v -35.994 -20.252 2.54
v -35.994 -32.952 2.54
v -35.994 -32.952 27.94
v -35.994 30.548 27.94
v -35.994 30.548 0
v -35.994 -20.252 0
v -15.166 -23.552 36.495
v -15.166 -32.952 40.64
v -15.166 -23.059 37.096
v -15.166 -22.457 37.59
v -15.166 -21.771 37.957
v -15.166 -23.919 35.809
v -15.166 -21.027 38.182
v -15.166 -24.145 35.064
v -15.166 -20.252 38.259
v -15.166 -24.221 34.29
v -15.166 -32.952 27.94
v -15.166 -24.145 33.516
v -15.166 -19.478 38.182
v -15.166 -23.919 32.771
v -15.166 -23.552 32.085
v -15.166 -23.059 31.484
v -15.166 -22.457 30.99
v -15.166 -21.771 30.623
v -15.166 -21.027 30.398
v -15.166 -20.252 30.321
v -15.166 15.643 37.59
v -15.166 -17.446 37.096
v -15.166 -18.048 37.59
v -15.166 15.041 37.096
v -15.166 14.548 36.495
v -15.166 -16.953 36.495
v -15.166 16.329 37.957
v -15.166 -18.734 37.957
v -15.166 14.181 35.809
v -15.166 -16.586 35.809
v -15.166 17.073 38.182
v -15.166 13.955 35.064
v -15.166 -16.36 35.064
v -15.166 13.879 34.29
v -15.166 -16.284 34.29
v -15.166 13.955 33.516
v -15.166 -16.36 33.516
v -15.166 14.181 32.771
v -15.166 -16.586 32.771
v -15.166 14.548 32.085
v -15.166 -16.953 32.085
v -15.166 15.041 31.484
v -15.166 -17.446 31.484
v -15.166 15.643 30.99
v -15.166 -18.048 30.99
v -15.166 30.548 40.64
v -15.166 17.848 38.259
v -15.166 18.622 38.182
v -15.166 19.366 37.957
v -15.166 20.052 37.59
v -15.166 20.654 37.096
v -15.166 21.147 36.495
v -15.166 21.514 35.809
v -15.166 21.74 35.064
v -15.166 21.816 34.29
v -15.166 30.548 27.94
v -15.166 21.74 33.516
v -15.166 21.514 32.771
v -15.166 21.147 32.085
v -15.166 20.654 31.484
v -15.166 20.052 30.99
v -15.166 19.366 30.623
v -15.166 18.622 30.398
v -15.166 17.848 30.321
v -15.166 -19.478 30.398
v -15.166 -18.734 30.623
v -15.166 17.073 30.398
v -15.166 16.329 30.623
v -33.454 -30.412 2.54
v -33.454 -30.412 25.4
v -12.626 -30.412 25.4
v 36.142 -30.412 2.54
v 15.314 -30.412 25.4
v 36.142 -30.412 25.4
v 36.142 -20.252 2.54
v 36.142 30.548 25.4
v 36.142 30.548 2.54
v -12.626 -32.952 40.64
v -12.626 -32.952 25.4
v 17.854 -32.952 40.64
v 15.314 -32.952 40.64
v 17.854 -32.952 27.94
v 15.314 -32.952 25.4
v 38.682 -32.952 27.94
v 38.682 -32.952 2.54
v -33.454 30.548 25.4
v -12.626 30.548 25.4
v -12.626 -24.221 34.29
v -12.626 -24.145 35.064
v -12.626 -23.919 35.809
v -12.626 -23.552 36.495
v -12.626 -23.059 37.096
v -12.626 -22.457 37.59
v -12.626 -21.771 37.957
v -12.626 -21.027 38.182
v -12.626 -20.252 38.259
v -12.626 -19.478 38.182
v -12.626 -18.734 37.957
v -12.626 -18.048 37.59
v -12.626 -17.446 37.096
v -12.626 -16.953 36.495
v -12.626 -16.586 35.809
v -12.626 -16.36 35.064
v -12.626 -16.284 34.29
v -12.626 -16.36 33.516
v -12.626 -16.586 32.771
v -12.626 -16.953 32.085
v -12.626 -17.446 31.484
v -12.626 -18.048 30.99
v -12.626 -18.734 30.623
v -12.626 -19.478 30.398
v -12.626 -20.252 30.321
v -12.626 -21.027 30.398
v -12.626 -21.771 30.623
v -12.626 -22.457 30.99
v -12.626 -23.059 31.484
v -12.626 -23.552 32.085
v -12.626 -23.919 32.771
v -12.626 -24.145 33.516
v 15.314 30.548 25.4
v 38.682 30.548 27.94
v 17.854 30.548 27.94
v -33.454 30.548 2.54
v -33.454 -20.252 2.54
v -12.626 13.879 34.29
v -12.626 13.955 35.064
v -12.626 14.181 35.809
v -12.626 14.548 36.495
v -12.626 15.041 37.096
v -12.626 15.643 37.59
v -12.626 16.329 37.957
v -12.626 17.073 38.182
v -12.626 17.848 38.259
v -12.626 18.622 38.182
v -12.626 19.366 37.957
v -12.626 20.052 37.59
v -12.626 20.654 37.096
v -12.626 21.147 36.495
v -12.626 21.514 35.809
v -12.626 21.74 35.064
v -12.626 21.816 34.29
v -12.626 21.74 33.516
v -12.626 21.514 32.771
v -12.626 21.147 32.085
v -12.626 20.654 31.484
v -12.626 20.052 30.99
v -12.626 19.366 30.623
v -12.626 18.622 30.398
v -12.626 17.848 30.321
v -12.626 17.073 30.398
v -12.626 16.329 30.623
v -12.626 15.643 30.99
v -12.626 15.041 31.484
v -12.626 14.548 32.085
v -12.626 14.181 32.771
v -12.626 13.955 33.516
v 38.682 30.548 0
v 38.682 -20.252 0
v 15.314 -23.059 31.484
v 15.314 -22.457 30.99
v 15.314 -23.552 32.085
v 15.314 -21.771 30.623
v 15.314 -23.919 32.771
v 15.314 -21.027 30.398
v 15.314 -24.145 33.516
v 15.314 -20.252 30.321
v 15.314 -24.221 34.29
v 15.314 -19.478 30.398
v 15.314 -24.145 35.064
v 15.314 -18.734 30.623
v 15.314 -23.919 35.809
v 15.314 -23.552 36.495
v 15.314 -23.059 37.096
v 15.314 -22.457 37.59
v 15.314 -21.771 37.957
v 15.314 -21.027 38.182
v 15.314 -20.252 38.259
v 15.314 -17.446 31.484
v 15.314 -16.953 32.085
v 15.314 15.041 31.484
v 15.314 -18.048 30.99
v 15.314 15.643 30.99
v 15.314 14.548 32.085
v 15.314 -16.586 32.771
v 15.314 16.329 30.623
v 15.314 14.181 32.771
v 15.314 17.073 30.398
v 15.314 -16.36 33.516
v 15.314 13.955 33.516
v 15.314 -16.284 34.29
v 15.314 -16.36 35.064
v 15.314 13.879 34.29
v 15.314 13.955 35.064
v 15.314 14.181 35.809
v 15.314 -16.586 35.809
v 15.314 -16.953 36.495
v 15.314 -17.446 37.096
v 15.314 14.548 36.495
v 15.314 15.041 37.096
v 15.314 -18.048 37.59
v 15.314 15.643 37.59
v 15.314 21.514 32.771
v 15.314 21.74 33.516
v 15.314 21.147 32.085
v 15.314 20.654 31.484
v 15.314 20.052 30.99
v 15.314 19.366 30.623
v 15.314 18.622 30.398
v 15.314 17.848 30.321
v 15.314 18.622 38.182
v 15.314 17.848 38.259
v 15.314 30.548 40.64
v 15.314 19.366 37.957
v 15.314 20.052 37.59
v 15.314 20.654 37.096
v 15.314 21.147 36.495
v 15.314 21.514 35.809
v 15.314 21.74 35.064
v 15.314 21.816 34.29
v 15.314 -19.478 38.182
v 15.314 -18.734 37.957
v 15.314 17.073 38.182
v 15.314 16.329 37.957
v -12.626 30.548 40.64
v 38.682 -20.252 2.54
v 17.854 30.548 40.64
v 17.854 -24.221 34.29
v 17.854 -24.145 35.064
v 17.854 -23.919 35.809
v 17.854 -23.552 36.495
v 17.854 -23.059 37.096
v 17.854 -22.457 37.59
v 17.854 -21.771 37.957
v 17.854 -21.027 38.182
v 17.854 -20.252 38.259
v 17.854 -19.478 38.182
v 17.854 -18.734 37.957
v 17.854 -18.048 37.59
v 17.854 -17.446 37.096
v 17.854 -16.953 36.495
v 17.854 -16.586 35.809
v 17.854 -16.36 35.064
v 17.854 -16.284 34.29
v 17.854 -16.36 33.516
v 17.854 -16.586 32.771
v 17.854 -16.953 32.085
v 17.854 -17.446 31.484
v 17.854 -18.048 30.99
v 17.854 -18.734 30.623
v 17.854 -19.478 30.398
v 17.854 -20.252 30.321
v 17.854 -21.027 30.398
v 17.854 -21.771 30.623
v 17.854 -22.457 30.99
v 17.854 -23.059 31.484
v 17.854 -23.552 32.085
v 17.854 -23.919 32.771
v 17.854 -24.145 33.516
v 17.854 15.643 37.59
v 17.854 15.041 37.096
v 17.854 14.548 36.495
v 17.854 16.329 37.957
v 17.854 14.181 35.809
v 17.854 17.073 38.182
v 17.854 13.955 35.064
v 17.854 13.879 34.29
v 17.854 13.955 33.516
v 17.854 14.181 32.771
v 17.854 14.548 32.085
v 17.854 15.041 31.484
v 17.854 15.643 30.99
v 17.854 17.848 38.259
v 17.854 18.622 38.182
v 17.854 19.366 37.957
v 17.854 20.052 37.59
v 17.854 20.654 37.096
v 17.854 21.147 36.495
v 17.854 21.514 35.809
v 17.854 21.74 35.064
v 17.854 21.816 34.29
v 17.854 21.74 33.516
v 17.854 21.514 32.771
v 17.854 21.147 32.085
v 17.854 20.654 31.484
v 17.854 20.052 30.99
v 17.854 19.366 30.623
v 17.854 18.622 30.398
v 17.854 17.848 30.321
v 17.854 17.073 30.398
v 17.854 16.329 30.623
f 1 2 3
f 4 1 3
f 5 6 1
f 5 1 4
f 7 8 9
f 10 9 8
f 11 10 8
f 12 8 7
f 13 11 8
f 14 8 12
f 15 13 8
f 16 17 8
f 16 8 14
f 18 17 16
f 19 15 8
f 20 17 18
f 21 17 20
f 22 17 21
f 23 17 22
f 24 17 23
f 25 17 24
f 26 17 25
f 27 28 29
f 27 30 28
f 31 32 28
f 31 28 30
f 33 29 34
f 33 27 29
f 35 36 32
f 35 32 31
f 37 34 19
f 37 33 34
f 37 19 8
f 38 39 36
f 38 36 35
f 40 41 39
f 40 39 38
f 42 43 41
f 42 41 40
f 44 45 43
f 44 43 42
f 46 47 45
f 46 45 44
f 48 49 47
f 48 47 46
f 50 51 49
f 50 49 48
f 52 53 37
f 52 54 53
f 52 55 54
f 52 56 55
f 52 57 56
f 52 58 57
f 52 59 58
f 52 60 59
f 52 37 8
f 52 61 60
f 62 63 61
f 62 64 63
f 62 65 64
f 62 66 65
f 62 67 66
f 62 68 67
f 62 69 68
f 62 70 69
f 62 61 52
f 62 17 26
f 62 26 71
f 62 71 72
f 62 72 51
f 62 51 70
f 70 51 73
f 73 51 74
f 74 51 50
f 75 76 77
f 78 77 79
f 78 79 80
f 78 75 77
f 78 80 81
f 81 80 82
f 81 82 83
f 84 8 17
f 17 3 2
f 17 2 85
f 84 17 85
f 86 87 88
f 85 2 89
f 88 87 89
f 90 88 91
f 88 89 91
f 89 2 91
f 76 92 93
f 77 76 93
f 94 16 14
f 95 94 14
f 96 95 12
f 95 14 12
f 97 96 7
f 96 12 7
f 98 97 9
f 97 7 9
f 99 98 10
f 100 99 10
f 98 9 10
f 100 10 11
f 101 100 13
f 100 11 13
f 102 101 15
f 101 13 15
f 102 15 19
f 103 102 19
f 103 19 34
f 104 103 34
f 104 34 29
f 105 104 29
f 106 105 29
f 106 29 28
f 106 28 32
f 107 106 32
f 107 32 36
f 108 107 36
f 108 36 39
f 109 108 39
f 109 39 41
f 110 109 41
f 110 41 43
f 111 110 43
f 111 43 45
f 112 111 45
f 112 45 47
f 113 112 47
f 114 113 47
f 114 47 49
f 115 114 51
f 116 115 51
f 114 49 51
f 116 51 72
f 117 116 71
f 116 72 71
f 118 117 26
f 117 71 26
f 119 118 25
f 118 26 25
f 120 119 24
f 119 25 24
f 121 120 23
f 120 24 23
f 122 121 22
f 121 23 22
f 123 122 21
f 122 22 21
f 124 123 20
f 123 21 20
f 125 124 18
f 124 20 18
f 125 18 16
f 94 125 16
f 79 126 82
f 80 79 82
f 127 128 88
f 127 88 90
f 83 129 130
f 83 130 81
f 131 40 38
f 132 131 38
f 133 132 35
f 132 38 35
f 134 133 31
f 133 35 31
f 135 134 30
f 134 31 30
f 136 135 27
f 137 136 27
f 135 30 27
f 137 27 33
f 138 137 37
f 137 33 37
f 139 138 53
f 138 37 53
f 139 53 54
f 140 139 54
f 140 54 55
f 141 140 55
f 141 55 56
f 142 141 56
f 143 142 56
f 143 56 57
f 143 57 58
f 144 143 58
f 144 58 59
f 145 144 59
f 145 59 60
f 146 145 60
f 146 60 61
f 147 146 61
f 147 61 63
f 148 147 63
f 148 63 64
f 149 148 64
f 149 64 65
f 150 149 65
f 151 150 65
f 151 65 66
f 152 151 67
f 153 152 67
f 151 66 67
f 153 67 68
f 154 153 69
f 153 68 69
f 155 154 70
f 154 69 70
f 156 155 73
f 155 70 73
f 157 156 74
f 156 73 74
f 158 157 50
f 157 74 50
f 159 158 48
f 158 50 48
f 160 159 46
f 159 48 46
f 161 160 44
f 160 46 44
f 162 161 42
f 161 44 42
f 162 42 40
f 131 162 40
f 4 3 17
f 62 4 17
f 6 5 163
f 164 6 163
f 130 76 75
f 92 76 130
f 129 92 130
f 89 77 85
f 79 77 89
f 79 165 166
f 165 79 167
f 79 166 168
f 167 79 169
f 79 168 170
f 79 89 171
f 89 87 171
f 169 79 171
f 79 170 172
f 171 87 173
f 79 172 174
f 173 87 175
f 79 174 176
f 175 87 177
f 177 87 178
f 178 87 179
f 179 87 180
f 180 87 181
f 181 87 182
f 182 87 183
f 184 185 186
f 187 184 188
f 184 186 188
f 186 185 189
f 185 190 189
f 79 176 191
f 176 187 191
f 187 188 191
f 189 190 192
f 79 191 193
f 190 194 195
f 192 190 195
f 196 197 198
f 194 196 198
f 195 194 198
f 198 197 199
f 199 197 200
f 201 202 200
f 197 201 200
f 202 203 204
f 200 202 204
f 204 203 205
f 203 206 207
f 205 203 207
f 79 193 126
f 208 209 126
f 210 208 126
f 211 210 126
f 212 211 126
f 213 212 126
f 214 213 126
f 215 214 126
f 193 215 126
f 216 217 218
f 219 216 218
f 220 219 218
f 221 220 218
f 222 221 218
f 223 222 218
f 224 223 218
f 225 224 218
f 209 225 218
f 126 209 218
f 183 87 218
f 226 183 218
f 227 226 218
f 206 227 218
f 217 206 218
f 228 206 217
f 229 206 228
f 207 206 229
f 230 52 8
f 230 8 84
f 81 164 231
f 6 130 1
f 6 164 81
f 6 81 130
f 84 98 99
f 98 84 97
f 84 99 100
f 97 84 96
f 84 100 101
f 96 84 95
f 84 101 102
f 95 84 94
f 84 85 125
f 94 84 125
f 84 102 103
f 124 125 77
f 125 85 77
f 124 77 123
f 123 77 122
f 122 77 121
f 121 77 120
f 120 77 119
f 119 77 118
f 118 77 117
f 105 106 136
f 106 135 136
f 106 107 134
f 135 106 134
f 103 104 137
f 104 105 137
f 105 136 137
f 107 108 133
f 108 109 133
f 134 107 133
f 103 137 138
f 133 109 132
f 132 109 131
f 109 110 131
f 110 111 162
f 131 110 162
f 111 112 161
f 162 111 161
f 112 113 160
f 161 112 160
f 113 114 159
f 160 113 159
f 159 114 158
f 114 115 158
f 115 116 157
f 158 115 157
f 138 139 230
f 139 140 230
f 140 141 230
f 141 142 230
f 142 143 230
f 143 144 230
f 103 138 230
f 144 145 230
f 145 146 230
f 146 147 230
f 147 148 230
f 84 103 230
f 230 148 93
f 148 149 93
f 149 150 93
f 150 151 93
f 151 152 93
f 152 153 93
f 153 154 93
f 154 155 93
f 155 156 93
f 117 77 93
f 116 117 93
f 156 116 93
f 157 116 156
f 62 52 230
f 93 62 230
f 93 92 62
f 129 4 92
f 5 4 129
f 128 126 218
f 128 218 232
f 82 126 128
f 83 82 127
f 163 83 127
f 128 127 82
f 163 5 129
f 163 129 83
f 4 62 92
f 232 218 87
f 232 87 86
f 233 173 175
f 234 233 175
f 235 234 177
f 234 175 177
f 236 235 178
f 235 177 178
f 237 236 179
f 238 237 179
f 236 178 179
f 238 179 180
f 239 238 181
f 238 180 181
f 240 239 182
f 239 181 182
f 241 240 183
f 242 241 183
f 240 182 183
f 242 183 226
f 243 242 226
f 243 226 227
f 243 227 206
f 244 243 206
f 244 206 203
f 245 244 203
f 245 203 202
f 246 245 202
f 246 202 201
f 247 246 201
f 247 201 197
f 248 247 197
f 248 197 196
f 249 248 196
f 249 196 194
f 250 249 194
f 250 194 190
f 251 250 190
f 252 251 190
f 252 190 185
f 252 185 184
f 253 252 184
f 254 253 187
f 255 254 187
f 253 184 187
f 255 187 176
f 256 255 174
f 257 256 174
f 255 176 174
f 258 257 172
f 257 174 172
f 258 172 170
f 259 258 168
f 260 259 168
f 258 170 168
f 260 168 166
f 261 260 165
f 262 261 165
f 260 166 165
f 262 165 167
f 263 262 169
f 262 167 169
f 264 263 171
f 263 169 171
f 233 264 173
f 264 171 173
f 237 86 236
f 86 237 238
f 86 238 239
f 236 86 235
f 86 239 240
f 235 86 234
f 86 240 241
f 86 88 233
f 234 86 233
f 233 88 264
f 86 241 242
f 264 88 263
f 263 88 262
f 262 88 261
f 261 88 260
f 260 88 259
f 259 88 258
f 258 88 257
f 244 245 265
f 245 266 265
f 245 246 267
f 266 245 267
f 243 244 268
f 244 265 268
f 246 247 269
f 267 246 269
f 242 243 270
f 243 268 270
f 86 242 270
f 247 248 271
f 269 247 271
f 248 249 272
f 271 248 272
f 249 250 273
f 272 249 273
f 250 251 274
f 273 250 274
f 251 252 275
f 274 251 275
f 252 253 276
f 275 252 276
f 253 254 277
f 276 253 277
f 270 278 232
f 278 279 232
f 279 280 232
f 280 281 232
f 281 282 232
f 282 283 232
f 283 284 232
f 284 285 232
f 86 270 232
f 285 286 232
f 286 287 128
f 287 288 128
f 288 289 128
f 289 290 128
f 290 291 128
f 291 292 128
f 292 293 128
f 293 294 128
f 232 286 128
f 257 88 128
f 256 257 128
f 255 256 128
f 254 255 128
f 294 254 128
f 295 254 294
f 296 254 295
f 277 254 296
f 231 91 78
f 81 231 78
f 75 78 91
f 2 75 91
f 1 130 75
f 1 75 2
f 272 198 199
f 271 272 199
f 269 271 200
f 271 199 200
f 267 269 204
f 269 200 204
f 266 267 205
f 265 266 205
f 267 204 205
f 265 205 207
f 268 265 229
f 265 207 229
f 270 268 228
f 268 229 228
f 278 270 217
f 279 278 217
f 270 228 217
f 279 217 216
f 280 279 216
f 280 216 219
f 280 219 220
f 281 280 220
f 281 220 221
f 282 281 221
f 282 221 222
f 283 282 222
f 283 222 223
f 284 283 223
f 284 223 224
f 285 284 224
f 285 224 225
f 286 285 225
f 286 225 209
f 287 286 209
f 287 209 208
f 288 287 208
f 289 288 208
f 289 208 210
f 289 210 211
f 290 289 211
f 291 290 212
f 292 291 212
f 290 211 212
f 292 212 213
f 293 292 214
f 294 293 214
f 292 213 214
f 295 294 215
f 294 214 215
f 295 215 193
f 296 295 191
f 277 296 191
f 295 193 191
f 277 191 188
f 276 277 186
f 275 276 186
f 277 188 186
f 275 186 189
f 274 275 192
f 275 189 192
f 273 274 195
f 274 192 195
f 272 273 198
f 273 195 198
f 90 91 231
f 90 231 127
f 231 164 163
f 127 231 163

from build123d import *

# Parameters (mm, degrees)
SKETCH1_W           = 74.676
SKETCH1_H           = 63.5
BOSS_EXTRUDE1_DEPTH = 27.94
SKETCH2_W           = 69.596
SKETCH2_H           = 22.86
CUT_EXTRUDE1_DEPTH  = 60.96
SKETCH3_W           = 27.94
SKETCH3_H           = 63.5
CUT_EXTRUDE2_DEPTH  = 2.54
SKETCH4_W           = 74.676
SKETCH4_H           = 12.7
CUT_EXTRUDE3_DEPTH  = 2.54
SKETCH5_W           = 2.54
SKETCH5_H           = 63.5
BOSS_EXTRUDE2_DEPTH = 12.7
SKETCH6_R           = 3.96875
CUT_EXTRUDE4_DEPTH  = 50.8


with BuildPart() as part:
    # Sketch1 → Boss-Extrude1 (new body)
    with BuildSketch(Plane.XY):
        with Locations((1.344432395, -1.20243972)):
            Rectangle(SKETCH1_W, SKETCH1_H)
    extrude(amount=BOSS_EXTRUDE1_DEPTH)

    # Sketch2 → Cut-Extrude1 (cut)
    with BuildSketch(Plane(origin=(0, 30.54756028, 0), x_dir=(1, 0, 0), z_dir=(0, 1, 0))):
        with Locations((1.344432395, -13.97)):
            Rectangle(SKETCH2_W, SKETCH2_H)
    extrude(amount=-CUT_EXTRUDE1_DEPTH, mode=Mode.SUBTRACT)

    # Sketch3 → Cut-Extrude2 (cut)
    with BuildSketch(Plane.XY.offset(27.94)):
        with Locations((1.344432395, -1.20243972)):
            Rectangle(SKETCH3_W, SKETCH3_H)
    extrude(amount=-CUT_EXTRUDE2_DEPTH, mode=Mode.SUBTRACT)

    # Sketch4 → Cut-Extrude3 (cut)
    with BuildSketch(Plane(origin=(0, 0, 0), x_dir=(-1, 0, 0), z_dir=(0, 0, -1))):
        with Locations((-1.344432395, -26.60243972)):
            Rectangle(SKETCH4_W, SKETCH4_H)
    extrude(amount=-CUT_EXTRUDE3_DEPTH, mode=Mode.SUBTRACT)

    # Sketch5 → Boss-Extrude2 (add)
    with BuildSketch(Plane.XY.offset(27.94)):
        with Locations((-13.895567605, -1.20243972)):
            Rectangle(SKETCH5_W, SKETCH5_H)
        with Locations((16.584432395, -1.20243972)):
            Rectangle(SKETCH5_W, SKETCH5_H)
    extrude(amount=BOSS_EXTRUDE2_DEPTH)

    # Sketch6 → Cut-Extrude4 (cut)
    with BuildSketch(Plane.ZY.offset(15.165567605)):
        with Locations(Location((34.29, 17.84756028, 0), (0, 0, 270))):
            Circle(SKETCH6_R)
        with Locations(Location((34.29, -20.25243972, 0), (0, 0, 270))):
            Circle(SKETCH6_R)
    extrude(amount=-CUT_EXTRUDE4_DEPTH, mode=Mode.SUBTRACT)


solid = part.part
